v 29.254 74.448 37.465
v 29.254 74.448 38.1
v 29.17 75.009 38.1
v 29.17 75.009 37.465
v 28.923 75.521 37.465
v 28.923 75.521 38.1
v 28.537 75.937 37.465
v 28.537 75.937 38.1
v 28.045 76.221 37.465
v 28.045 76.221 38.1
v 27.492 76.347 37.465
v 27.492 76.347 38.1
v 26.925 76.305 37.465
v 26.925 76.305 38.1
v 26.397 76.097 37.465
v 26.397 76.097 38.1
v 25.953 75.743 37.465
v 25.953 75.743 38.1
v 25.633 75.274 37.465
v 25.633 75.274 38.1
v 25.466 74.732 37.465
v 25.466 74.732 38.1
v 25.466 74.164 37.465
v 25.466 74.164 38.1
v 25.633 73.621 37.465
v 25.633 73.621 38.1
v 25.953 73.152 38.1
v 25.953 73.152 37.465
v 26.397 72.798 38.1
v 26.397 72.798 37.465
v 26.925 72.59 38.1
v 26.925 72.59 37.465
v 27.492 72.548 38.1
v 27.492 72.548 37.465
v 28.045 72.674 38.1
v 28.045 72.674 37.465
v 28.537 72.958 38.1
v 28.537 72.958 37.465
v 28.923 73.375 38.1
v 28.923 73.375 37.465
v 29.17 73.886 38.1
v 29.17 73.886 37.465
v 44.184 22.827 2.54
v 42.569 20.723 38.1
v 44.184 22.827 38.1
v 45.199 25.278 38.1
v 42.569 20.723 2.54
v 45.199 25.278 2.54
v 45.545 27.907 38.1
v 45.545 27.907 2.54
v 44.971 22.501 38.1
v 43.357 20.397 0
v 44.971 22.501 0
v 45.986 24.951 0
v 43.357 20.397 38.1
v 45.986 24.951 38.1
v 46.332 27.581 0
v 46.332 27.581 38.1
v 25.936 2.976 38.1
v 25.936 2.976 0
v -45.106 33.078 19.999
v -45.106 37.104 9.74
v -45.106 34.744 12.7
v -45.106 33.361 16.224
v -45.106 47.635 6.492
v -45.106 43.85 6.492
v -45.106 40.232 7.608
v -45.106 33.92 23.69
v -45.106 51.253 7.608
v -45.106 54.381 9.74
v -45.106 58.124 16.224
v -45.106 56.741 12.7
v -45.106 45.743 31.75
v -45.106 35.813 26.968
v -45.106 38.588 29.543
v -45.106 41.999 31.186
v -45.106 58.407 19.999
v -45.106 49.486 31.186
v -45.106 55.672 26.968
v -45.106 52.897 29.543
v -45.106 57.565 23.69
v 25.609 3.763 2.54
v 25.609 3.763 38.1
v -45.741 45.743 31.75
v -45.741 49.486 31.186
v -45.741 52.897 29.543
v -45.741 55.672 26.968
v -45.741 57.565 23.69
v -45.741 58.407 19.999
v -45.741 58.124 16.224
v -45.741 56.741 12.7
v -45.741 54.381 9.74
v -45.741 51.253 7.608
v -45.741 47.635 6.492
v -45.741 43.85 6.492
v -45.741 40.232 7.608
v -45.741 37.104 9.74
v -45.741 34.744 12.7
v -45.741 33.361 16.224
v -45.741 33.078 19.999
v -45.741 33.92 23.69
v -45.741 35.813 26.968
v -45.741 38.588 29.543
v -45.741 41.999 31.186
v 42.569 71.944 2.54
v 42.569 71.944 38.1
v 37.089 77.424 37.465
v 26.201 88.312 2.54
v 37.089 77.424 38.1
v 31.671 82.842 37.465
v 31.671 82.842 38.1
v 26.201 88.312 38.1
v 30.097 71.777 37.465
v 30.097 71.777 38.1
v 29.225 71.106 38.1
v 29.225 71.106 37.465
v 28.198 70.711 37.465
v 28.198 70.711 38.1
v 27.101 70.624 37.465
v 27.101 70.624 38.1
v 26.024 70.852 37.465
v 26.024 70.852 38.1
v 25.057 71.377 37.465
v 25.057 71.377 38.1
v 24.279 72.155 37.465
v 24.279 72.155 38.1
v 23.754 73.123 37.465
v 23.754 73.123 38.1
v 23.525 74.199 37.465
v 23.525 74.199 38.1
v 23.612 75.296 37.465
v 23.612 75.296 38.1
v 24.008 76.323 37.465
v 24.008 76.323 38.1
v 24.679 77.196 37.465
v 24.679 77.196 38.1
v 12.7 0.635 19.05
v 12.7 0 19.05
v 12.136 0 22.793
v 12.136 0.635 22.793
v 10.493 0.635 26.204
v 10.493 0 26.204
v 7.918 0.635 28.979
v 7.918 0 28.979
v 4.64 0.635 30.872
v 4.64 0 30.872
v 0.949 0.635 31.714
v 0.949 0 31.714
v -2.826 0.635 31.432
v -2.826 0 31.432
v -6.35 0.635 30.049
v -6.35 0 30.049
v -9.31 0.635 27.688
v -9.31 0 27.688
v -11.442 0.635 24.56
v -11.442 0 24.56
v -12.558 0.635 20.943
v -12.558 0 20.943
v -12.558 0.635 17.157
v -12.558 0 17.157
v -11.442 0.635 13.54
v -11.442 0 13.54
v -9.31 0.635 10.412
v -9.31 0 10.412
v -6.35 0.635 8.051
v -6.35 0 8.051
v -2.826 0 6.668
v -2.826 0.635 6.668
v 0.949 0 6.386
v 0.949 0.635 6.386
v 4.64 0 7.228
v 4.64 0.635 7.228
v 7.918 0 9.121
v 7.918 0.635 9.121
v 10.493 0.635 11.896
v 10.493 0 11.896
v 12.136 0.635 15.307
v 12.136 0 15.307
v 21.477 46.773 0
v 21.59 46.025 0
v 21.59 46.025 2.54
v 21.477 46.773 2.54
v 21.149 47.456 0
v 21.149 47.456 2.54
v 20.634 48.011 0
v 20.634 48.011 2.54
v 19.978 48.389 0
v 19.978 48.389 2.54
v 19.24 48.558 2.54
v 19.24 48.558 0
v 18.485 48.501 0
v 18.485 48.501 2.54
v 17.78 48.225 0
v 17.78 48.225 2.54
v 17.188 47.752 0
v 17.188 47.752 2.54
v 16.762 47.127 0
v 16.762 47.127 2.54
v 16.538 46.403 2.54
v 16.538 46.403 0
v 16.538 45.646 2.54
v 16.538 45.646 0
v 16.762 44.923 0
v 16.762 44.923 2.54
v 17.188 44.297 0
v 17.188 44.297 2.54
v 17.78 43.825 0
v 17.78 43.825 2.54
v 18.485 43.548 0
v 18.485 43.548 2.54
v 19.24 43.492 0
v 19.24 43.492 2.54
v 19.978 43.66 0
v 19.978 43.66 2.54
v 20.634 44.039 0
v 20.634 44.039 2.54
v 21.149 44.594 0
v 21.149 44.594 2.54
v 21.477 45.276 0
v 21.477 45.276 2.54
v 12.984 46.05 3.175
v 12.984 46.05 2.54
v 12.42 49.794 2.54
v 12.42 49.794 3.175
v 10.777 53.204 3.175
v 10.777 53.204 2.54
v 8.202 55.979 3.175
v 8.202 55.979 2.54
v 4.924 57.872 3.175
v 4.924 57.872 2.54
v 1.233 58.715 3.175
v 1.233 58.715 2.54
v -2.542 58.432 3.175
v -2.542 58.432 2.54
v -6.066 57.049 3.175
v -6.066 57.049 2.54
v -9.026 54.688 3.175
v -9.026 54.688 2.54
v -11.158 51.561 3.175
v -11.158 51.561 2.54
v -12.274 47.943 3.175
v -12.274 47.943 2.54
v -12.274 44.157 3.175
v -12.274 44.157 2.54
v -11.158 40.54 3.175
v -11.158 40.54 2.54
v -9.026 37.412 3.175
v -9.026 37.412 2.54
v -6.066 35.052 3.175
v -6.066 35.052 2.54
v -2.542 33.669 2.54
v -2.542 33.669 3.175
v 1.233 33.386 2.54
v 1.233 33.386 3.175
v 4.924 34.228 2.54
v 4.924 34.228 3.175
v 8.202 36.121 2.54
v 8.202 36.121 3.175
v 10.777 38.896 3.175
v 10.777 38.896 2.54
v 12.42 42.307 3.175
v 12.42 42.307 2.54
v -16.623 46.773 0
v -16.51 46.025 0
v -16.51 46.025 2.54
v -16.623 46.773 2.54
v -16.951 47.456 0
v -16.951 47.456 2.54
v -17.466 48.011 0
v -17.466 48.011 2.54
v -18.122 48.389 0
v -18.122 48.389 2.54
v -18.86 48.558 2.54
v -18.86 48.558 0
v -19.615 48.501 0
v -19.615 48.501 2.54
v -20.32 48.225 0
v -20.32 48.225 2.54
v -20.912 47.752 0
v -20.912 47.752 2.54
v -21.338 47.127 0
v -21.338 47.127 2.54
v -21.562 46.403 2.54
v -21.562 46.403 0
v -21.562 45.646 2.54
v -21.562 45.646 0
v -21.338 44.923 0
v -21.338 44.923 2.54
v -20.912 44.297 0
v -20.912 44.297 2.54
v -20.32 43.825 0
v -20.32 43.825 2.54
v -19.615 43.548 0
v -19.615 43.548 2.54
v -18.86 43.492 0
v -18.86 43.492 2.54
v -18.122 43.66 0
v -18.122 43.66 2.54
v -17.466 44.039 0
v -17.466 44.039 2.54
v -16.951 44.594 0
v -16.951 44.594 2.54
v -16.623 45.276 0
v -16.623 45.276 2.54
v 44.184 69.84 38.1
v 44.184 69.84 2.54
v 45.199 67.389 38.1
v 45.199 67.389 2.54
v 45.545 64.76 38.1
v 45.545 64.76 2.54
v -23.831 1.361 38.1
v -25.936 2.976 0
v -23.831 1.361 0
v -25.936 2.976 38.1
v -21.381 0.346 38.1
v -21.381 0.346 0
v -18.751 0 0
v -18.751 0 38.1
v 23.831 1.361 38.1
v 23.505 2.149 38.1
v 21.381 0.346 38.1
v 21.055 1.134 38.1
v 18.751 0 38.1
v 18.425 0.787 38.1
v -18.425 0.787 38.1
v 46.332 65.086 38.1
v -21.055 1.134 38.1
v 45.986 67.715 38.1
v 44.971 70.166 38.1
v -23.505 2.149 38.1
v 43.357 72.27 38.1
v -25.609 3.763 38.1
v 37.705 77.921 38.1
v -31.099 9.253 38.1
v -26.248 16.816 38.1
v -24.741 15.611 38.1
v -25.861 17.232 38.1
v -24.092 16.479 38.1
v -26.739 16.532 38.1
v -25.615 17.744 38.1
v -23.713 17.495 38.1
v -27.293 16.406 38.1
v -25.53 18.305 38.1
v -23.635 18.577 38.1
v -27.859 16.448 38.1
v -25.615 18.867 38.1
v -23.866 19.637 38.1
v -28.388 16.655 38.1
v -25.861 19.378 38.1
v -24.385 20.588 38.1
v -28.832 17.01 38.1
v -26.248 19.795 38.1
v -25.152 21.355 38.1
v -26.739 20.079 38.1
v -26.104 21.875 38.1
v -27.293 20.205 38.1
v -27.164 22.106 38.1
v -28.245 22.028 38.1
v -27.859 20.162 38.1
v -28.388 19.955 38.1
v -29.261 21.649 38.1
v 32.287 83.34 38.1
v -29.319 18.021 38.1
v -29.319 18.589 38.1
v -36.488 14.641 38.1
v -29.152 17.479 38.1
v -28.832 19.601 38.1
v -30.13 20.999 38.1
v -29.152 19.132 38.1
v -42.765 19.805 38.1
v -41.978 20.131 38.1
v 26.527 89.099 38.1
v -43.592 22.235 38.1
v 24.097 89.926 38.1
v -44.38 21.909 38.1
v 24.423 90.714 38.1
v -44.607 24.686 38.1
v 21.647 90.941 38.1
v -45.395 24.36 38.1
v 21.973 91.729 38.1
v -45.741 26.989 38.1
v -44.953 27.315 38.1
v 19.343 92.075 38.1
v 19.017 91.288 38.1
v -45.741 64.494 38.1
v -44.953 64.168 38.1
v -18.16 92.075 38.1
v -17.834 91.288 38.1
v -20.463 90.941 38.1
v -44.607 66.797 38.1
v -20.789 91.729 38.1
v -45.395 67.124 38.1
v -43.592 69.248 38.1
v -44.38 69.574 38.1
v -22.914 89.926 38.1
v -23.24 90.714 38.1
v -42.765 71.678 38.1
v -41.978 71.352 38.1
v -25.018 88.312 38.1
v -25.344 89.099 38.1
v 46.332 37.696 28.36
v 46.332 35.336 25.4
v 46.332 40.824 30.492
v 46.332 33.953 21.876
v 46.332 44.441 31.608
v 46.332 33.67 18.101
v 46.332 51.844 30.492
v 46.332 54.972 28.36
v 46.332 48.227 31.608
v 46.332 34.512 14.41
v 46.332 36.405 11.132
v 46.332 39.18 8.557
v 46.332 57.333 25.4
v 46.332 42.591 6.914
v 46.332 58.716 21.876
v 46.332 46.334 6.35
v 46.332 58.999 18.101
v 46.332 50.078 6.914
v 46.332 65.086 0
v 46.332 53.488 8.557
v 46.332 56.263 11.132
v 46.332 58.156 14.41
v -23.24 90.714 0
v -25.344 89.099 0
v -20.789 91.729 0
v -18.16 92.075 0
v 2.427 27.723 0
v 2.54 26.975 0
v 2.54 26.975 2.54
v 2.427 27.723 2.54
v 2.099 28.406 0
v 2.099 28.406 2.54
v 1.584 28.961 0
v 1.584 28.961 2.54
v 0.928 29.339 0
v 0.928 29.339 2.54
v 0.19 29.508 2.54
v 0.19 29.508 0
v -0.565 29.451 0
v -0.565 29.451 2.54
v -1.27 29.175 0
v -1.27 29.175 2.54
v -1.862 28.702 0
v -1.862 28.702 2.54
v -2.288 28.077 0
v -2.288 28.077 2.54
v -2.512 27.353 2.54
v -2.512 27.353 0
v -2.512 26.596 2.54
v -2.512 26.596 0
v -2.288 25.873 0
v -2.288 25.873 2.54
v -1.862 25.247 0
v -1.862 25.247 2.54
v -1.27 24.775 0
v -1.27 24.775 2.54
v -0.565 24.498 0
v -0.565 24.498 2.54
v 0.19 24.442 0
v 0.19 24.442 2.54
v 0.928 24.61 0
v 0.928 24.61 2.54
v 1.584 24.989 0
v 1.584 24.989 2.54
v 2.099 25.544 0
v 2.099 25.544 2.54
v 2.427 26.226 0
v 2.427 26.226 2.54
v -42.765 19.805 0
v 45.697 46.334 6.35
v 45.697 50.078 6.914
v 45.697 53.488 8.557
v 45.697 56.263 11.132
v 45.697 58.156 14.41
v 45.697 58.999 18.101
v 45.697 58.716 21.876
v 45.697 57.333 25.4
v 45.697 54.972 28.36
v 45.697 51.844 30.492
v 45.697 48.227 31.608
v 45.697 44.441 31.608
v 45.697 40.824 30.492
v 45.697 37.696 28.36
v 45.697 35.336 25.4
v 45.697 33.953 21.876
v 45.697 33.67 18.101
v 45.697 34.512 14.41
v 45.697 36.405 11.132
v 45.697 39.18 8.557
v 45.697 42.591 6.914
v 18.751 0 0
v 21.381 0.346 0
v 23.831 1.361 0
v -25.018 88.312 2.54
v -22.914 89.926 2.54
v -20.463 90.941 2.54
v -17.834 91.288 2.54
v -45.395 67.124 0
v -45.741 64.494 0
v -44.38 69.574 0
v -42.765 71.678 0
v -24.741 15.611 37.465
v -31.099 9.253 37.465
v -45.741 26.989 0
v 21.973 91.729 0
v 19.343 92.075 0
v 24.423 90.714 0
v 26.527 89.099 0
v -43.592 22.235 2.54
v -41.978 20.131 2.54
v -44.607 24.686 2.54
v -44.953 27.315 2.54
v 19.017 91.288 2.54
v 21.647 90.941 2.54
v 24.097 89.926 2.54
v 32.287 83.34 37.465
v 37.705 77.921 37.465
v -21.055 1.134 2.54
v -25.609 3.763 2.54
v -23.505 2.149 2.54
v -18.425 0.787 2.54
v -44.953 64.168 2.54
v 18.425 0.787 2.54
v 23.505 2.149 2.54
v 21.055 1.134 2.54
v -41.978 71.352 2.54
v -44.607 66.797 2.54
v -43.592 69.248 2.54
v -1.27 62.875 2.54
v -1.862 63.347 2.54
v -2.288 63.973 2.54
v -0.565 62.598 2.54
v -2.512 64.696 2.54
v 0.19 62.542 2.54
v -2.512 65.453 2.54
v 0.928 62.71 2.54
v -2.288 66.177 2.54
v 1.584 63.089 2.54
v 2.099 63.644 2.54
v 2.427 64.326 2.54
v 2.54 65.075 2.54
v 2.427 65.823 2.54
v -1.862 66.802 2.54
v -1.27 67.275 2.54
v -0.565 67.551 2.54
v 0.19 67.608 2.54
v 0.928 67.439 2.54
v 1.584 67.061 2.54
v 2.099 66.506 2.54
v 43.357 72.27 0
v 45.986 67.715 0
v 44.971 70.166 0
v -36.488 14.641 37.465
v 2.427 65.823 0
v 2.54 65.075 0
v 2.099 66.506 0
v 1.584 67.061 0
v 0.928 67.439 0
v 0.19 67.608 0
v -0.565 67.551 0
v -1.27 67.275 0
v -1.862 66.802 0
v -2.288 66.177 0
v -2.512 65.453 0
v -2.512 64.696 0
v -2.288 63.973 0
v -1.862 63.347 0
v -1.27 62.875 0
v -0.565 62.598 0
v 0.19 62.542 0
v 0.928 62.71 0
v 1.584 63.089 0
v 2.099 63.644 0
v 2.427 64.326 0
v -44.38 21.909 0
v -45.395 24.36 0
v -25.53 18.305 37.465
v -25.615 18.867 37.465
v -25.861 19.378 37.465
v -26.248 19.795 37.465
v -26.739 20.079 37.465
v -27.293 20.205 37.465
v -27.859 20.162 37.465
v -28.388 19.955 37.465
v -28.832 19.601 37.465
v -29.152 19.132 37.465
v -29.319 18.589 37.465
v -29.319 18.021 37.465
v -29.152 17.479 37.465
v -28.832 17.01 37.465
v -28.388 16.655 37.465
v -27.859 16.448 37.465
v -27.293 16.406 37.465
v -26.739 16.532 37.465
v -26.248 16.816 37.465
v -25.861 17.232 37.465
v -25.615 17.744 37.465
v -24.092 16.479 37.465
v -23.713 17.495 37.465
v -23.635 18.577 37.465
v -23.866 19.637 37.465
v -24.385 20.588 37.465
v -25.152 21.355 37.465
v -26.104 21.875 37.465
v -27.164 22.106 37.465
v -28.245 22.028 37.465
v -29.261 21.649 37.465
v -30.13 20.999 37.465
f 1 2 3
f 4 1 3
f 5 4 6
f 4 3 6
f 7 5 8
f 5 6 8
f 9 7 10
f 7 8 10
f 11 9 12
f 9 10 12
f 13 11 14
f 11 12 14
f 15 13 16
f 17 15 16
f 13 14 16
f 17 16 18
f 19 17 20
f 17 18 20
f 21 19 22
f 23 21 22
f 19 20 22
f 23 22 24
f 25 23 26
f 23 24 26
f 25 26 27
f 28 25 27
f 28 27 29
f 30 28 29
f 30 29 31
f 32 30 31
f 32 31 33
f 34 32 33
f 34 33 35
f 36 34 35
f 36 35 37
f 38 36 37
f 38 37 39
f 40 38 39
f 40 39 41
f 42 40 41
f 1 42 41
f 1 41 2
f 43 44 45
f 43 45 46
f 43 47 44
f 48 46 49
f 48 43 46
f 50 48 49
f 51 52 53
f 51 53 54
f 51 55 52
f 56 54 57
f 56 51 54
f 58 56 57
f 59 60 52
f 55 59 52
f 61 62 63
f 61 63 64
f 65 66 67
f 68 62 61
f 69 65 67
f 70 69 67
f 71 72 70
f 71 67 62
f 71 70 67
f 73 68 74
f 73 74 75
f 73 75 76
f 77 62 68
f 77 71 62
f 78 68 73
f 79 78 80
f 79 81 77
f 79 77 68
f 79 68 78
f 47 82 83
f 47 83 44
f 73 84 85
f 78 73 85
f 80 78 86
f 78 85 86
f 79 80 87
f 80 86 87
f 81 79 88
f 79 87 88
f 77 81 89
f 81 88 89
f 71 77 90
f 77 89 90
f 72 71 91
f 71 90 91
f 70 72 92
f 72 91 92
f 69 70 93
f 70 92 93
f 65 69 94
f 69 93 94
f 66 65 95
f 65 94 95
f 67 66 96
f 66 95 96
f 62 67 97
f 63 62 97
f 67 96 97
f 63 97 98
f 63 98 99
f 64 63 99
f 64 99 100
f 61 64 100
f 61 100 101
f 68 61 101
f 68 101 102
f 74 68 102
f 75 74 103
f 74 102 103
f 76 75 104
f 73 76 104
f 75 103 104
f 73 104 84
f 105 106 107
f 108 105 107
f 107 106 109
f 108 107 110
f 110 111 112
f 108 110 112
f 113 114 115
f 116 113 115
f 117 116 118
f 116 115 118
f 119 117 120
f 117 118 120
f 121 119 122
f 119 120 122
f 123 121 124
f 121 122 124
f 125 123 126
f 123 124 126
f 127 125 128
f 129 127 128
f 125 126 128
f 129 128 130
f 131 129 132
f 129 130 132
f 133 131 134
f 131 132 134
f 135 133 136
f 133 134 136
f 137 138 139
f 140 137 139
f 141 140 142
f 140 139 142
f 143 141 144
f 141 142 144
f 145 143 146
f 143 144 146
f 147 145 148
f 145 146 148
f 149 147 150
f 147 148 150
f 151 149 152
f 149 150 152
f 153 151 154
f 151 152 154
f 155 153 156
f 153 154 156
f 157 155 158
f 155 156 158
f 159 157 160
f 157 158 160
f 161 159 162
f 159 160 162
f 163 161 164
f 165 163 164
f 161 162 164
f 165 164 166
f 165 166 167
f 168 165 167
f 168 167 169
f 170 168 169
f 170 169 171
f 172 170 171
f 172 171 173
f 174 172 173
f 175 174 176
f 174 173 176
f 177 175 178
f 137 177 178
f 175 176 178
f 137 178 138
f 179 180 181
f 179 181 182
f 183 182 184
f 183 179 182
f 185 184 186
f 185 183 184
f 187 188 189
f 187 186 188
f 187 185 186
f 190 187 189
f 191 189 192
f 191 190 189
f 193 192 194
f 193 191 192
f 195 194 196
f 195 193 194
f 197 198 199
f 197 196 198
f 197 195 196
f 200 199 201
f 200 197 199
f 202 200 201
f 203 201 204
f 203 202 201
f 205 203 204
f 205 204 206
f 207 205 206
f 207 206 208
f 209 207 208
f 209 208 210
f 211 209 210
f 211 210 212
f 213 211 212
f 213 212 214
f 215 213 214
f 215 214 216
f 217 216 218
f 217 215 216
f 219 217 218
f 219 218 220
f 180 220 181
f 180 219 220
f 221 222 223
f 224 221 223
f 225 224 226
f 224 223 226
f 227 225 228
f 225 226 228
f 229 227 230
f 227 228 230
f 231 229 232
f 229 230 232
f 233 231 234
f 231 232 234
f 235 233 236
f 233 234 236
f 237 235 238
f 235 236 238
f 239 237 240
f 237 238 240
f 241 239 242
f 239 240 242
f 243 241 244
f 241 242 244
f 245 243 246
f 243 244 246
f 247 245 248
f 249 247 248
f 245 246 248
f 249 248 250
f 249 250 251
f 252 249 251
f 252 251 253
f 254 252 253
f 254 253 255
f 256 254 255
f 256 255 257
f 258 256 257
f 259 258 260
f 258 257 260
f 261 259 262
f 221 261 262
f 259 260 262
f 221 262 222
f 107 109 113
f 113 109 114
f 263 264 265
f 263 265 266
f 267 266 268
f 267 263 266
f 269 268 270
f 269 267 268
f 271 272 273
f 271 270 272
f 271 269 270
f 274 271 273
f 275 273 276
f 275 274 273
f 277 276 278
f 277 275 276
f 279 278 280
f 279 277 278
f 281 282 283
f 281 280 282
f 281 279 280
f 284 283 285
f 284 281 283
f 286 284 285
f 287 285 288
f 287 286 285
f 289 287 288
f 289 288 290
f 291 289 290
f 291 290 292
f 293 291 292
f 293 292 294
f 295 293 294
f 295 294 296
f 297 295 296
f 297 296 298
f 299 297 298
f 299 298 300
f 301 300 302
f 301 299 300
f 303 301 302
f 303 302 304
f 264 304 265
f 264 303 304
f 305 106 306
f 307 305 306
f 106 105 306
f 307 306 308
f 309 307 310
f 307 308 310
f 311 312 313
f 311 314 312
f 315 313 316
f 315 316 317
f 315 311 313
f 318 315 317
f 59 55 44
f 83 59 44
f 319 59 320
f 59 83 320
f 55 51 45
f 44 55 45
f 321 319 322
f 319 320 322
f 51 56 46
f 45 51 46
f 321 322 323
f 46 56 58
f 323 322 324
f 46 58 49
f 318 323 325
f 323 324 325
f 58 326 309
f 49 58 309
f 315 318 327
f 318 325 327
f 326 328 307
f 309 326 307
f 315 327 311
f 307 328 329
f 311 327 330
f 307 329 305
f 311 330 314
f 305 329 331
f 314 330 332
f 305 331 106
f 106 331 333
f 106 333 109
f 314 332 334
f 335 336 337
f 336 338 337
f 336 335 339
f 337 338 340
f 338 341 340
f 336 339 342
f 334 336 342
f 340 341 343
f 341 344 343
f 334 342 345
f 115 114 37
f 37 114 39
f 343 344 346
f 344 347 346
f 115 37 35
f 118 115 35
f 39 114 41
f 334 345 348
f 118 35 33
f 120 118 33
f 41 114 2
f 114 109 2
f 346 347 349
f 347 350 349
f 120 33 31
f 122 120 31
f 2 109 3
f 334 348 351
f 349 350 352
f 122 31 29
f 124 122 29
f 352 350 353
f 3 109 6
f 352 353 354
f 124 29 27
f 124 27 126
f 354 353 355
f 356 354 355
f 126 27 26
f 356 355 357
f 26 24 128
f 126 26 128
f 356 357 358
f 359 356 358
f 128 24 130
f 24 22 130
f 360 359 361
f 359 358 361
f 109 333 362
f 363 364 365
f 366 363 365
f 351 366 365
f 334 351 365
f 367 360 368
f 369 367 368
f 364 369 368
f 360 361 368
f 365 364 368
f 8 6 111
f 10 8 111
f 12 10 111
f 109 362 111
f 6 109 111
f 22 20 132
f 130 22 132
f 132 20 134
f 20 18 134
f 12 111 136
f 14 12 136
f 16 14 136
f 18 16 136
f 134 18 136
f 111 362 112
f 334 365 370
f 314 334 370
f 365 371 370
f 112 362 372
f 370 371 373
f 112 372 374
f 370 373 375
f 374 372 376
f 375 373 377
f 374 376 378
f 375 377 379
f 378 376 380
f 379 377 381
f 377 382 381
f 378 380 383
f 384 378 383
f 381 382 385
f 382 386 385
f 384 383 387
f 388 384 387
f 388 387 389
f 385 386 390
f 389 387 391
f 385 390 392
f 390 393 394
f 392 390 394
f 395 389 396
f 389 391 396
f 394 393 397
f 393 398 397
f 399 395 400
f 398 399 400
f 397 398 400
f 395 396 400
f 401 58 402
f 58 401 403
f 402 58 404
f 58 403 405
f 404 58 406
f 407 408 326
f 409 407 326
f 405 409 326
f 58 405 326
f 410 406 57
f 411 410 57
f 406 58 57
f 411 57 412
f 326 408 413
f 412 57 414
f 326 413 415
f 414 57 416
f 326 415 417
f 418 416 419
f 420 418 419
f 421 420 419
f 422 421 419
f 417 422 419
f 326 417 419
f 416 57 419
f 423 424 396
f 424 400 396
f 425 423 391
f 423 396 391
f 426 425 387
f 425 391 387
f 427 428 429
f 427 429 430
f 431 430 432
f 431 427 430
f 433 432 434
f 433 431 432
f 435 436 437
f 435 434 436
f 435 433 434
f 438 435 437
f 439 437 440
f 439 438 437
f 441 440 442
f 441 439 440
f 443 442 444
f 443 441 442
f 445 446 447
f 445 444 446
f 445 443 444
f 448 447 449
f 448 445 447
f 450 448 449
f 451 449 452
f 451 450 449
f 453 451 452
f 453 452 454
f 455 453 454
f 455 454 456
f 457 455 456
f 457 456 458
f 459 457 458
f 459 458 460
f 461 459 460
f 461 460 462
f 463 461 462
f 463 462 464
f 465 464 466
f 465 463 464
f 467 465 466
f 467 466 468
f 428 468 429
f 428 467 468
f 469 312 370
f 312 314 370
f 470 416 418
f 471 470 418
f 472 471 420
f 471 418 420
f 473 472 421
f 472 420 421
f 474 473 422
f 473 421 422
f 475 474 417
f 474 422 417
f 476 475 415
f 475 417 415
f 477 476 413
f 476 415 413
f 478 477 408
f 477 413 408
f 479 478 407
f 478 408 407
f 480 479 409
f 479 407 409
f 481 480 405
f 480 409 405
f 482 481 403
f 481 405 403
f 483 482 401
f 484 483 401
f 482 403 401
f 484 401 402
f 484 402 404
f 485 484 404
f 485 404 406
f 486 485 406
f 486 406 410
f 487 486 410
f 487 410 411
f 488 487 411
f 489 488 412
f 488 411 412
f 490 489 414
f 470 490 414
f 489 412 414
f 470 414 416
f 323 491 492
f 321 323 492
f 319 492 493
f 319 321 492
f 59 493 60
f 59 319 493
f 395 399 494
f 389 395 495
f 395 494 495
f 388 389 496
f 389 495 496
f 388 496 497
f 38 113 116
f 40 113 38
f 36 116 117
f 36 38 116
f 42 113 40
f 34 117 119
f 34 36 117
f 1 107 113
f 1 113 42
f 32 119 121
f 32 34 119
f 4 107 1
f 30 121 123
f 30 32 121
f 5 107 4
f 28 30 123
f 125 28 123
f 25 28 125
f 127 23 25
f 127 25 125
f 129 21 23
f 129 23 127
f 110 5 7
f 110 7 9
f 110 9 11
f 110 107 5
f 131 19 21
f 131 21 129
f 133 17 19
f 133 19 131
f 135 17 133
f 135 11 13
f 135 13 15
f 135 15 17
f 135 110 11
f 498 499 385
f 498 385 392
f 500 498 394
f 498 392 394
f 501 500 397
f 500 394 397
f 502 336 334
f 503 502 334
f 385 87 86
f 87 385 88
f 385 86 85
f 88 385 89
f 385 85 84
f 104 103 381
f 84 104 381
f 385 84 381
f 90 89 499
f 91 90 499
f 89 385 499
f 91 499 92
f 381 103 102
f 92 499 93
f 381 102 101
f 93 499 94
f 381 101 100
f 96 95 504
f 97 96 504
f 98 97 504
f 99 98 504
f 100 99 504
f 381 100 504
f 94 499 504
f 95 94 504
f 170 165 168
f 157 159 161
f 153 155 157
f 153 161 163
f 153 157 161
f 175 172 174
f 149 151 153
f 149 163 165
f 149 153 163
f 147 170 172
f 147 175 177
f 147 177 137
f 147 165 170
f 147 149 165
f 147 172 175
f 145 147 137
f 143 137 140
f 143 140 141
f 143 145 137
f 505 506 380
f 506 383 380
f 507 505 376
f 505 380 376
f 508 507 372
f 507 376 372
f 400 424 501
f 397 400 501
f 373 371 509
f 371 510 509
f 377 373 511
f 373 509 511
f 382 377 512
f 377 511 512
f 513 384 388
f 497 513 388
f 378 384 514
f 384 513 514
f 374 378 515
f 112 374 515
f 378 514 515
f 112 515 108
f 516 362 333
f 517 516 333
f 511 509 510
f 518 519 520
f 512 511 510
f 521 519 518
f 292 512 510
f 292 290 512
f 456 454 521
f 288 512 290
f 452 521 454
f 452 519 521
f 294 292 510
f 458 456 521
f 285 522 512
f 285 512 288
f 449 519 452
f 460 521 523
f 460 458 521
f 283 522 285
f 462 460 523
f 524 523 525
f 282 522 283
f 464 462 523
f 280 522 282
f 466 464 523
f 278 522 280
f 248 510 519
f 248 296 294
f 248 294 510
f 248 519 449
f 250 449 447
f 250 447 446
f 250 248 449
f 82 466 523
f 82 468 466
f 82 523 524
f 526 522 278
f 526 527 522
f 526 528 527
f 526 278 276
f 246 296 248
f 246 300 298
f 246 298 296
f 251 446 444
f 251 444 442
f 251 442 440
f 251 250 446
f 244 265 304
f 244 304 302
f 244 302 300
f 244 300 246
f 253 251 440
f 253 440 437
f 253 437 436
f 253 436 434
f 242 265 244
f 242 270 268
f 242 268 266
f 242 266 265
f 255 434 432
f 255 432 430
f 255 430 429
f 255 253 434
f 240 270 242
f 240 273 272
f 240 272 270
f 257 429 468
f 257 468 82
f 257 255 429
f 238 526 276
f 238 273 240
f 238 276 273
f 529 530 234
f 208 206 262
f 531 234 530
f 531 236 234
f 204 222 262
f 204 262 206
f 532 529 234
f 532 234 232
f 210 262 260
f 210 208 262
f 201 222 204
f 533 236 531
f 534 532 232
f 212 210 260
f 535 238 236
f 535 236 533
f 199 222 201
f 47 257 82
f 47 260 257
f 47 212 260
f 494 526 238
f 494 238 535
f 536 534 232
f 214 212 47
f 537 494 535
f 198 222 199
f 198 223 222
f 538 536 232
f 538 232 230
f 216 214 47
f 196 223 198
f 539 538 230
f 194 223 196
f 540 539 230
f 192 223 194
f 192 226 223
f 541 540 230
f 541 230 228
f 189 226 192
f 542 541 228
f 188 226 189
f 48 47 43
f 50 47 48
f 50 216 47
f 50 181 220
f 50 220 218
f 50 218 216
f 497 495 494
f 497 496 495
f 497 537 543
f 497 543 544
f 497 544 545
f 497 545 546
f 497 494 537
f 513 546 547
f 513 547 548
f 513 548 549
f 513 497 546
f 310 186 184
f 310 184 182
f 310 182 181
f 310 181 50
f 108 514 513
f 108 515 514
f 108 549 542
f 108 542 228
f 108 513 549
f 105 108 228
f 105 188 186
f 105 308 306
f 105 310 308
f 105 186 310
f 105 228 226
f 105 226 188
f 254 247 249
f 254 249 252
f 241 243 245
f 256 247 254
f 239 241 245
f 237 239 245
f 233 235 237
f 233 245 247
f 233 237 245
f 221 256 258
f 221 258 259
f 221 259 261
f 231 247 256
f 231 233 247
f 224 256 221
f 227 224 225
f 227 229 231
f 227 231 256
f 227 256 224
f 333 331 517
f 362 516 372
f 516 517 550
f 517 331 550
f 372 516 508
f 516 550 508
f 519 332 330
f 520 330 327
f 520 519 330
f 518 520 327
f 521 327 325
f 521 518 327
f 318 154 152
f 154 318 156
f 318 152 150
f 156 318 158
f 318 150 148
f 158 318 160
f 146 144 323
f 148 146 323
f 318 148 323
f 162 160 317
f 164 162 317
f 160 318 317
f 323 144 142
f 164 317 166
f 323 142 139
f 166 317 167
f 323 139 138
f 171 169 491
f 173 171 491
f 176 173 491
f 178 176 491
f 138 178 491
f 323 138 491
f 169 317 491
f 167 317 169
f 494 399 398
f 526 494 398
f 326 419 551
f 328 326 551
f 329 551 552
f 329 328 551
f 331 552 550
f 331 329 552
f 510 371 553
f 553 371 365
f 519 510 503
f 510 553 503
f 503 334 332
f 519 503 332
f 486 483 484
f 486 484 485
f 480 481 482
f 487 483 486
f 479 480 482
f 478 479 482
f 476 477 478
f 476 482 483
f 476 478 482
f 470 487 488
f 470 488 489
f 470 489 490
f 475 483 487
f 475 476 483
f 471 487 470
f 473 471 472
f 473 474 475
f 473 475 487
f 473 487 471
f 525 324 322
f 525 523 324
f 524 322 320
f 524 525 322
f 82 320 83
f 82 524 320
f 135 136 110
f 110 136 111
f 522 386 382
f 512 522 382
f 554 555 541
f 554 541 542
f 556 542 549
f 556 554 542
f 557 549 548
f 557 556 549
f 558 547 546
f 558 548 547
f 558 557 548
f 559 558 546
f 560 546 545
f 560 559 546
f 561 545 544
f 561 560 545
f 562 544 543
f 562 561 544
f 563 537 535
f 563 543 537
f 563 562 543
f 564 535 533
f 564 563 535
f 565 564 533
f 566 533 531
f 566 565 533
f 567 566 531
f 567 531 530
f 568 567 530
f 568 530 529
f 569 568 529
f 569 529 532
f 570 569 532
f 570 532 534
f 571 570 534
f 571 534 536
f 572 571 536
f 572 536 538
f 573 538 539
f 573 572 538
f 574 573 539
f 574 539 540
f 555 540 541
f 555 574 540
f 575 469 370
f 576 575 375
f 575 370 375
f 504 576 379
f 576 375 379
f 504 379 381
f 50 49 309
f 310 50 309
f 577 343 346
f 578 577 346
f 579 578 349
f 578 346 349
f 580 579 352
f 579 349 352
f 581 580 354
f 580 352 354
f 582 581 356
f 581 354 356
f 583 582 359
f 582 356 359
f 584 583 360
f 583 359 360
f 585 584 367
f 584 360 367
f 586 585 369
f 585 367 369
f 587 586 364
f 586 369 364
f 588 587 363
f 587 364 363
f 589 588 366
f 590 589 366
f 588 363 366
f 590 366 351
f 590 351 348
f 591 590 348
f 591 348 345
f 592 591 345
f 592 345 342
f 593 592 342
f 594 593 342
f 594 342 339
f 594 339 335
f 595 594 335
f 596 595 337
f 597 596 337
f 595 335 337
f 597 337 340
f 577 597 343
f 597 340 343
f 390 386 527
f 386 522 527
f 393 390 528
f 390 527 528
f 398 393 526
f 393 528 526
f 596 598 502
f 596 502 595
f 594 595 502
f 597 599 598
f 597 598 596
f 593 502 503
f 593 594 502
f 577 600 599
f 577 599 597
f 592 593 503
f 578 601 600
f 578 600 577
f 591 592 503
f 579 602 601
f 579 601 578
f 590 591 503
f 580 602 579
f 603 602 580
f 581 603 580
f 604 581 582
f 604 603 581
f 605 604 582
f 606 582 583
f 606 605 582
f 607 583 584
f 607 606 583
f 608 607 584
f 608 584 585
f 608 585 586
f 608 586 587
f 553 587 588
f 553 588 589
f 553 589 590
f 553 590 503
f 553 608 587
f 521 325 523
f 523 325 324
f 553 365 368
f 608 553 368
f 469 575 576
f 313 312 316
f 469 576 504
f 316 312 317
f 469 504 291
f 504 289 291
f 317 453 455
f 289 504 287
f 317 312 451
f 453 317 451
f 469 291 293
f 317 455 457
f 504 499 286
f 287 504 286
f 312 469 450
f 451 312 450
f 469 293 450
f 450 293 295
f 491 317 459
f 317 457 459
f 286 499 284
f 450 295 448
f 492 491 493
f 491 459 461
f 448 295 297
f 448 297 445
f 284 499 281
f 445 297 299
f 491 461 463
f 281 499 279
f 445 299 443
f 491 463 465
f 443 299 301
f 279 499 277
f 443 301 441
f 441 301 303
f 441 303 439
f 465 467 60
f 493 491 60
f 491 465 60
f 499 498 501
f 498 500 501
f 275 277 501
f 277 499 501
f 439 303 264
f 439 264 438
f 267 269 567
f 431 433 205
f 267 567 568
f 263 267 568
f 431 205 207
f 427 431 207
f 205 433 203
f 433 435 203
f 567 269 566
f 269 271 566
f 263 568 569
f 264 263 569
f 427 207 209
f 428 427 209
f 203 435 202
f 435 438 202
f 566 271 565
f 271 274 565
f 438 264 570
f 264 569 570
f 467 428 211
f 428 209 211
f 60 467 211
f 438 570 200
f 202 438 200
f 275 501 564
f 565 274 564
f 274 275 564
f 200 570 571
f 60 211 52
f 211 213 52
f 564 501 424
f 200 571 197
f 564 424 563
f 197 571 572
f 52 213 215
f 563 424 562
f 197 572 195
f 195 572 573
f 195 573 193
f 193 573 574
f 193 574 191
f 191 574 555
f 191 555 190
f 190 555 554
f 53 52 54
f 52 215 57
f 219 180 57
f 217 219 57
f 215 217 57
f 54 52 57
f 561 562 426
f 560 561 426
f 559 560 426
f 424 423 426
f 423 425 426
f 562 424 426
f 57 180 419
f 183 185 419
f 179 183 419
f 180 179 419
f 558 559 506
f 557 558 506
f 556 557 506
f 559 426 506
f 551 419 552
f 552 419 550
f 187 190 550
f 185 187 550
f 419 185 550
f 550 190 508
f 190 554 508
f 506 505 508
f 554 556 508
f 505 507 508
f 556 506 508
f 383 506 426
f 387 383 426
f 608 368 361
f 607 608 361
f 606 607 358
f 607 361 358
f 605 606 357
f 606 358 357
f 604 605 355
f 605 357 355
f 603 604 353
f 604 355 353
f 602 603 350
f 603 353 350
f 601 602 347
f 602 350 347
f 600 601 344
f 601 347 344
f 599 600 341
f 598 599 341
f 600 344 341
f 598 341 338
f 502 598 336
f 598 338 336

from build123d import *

# Parameters (mm, degrees)
BOSS_EXTRUDE1_DEPTH     = 38.1
CUT_EXTRUDE1_DEPTH      = 35.56
CUT_EXTRUDE9_DEPTH      = 110.891333521
CUT_EXTRUDE9_DEPTH_BACK = 110.891333521
SKETCH20_R              = 2.54
BOSS_EXTRUDE2_DEPTH     = 0.635
SKETCH9_R               = 1.905
CUT_EXTRUDE4_DEPTH      = 3.175
BOSS_EXTRUDE3_DEPTH     = 0.635
SKETCH12_R              = 1.905
CUT_EXTRUDE5_DEPTH      = 0.635
SKETCH13_R              = 12.7
BOSS_EXTRUDE4_DEPTH     = 0.635
SKETCH14_R              = 12.7
CUT_EXTRUDE6_DEPTH      = 0.635
SKETCH15_R              = 12.7
CUT_EXTRUDE7_DEPTH      = 0.635
SKETCH16_R              = 12.7
CUT_EXTRUDE8_DEPTH      = 0.635
FILLET1_R               = 10.16
FILLET2_R               = 10.16


with BuildPart() as part:
    # Sketch3 → Boss-Extrude1 (new body)
    with BuildSketch(Plane.XY):
        Polygon((-22.959817584, 0), (22.959817584, 0), (46.332381312, 23.372563728), (46.332381312, 69.294099898), (23.55148121, 92.075), (-22.368153958, 92.075), (-45.740717686, 68.702436272), (-45.740717686, 22.780900102), align=None)
    extrude(amount=BOSS_EXTRUDE1_DEPTH)

    # Sketch4 → Cut-Extrude1 (cut)
    with BuildSketch(Plane.XY.offset(38.1)):
        Polygon((23.225329451, 91.2876), (-22.042002199, 91.2876), (-44.953317686, 68.376284513), (-44.953317686, 23.107051861), (-22.633665825, 0.7874), (22.633665825, 0.7874), (45.544981312, 23.698715487), (45.544981312, 68.967948139), align=None)
    extrude(amount=-CUT_EXTRUDE1_DEPTH, mode=Mode.SUBTRACT)

    # Sketch20 → Cut-Extrude9 (cut, two sides: drawn at the far end of the back side and taken through both)
    with BuildSketch(Plane.XY.offset(-CUT_EXTRUDE9_DEPTH_BACK)):
        with Locations((0, 65.0748)):
            Circle(SKETCH20_R)
        with Locations((19.05, 46.0248)):
            Circle(SKETCH20_R)
        with Locations((0, 26.9748)):
            Circle(SKETCH20_R)
        with Locations((-19.05, 46.0248)):
            Circle(SKETCH20_R)
    extrude(amount=CUT_EXTRUDE9_DEPTH + CUT_EXTRUDE9_DEPTH_BACK, mode=Mode.SUBTRACT)

    # Sketch8 → Boss-Extrude2 (add)
    with BuildSketch(Plane.XY.offset(38.1)):
        with BuildLine():
            Line((24.678794584, 77.195818088), (32.28681384, 83.33966737))
            Line((32.28681384, 83.33966737), (37.705421486, 77.921059725))
            Line((37.705421486, 77.921059725), (30.09740223, 71.777210443))
            ThreePointArc((30.09740223, 71.777210443), (24.639652924, 71.738068783), (24.678794584, 77.195818088))
        make_face()
    extrude(amount=-BOSS_EXTRUDE2_DEPTH)

    # Sketch9 → Cut-Extrude4 (cut)
    with BuildSketch(Plane.XY.offset(38.1)):
        with Locations((27.349235463, 74.447651321)):
            Circle(SKETCH9_R)
    extrude(amount=-CUT_EXTRUDE4_DEPTH, mode=Mode.SUBTRACT)

    # Sketch11 → Boss-Extrude3 (add)
    with BuildSketch(Plane.XY.offset(38.1)):
        with BuildLine():
            Line((-37.044344471, 14.084526887), (-30.129547258, 20.9993241))
            ThreePointArc((-30.129547258, 20.9993241), (-24.741393586, 20.9993241), (-24.741393586, 15.611170428))
            Line((-24.741393586, 15.611170428), (-31.656190799, 8.696373215))
            Line((-31.656190799, 8.696373215), (-37.044344471, 14.084526887))
        make_face()
    extrude(amount=-BOSS_EXTRUDE3_DEPTH)

    # Sketch12 → Cut-Extrude5 (cut)
    with BuildSketch(Plane.XY.offset(38.1)):
        with Locations((-27.435470422, 18.305247264)):
            Circle(SKETCH12_R)
    extrude(amount=-CUT_EXTRUDE5_DEPTH, mode=Mode.SUBTRACT)

    # Sketch13 → Boss-Extrude4 (add)
    with BuildSketch(Plane.XY.offset(2.54)):
        with Locations((0.284082314, 46.0502)):
            Circle(SKETCH13_R)
    extrude(amount=BOSS_EXTRUDE4_DEPTH)

    # Sketch14 → Cut-Extrude6 (cut)
    with BuildSketch(Plane(origin=(46.332381312, 0, 0), x_dir=(0, 0, -1), z_dir=(1, 0, 0))):
        with Locations((-19.05, 46.334163728)):
            Circle(SKETCH14_R)
    extrude(amount=-CUT_EXTRUDE6_DEPTH, mode=Mode.SUBTRACT)

    # Sketch15 → Cut-Extrude7 (cut)
    with BuildSketch(Plane.ZY.offset(45.740717686)):
        with Locations((19.05, 45.742500102)):
            Circle(SKETCH15_R)
    extrude(amount=-CUT_EXTRUDE7_DEPTH, mode=Mode.SUBTRACT)

    # Sketch16 → Cut-Extrude8 (cut)
    with BuildSketch(Plane.XZ):
        with Locations((0, 19.05)):
            Circle(SKETCH16_R)
    extrude(amount=-CUT_EXTRUDE8_DEPTH, mode=Mode.SUBTRACT)

    # Fillet1
    fillet1_edges = [part.edges().sort_by_distance(p)[0] for p in [
        (23.55148121, 92.075, 19.05),
        (46.332381312, 69.294099898, 19.05),
        (46.332381312, 23.372563728, 19.05),
        (22.959817584, 0, 19.05),
        (-22.959817584, 0, 19.05),
        (-45.740717686, 22.780900102, 19.05),
        (-45.740717686, 68.702436272, 19.05),
        (-22.368153958, 92.075, 19.05),
    ]]
    fillet(fillet1_edges, radius=FILLET1_R)

    # Fillet2
    fillet2_edges = [part.edges().sort_by_distance(p)[0] for p in [
        (23.225329451, 91.2876, 20.32),
        (45.544981312, 68.967948139, 20.32),
        (45.544981312, 23.698715487, 20.32),
        (22.633665825, 0.7874, 20.32),
        (-22.633665825, 0.7874, 20.32),
        (-44.953317686, 23.107051861, 20.32),
        (-44.953317686, 68.376284513, 20.32),
        (-22.042002199, 91.2876, 20.32),
    ]]
    fillet(fillet2_edges, radius=FILLET2_R)


solid = part.part
